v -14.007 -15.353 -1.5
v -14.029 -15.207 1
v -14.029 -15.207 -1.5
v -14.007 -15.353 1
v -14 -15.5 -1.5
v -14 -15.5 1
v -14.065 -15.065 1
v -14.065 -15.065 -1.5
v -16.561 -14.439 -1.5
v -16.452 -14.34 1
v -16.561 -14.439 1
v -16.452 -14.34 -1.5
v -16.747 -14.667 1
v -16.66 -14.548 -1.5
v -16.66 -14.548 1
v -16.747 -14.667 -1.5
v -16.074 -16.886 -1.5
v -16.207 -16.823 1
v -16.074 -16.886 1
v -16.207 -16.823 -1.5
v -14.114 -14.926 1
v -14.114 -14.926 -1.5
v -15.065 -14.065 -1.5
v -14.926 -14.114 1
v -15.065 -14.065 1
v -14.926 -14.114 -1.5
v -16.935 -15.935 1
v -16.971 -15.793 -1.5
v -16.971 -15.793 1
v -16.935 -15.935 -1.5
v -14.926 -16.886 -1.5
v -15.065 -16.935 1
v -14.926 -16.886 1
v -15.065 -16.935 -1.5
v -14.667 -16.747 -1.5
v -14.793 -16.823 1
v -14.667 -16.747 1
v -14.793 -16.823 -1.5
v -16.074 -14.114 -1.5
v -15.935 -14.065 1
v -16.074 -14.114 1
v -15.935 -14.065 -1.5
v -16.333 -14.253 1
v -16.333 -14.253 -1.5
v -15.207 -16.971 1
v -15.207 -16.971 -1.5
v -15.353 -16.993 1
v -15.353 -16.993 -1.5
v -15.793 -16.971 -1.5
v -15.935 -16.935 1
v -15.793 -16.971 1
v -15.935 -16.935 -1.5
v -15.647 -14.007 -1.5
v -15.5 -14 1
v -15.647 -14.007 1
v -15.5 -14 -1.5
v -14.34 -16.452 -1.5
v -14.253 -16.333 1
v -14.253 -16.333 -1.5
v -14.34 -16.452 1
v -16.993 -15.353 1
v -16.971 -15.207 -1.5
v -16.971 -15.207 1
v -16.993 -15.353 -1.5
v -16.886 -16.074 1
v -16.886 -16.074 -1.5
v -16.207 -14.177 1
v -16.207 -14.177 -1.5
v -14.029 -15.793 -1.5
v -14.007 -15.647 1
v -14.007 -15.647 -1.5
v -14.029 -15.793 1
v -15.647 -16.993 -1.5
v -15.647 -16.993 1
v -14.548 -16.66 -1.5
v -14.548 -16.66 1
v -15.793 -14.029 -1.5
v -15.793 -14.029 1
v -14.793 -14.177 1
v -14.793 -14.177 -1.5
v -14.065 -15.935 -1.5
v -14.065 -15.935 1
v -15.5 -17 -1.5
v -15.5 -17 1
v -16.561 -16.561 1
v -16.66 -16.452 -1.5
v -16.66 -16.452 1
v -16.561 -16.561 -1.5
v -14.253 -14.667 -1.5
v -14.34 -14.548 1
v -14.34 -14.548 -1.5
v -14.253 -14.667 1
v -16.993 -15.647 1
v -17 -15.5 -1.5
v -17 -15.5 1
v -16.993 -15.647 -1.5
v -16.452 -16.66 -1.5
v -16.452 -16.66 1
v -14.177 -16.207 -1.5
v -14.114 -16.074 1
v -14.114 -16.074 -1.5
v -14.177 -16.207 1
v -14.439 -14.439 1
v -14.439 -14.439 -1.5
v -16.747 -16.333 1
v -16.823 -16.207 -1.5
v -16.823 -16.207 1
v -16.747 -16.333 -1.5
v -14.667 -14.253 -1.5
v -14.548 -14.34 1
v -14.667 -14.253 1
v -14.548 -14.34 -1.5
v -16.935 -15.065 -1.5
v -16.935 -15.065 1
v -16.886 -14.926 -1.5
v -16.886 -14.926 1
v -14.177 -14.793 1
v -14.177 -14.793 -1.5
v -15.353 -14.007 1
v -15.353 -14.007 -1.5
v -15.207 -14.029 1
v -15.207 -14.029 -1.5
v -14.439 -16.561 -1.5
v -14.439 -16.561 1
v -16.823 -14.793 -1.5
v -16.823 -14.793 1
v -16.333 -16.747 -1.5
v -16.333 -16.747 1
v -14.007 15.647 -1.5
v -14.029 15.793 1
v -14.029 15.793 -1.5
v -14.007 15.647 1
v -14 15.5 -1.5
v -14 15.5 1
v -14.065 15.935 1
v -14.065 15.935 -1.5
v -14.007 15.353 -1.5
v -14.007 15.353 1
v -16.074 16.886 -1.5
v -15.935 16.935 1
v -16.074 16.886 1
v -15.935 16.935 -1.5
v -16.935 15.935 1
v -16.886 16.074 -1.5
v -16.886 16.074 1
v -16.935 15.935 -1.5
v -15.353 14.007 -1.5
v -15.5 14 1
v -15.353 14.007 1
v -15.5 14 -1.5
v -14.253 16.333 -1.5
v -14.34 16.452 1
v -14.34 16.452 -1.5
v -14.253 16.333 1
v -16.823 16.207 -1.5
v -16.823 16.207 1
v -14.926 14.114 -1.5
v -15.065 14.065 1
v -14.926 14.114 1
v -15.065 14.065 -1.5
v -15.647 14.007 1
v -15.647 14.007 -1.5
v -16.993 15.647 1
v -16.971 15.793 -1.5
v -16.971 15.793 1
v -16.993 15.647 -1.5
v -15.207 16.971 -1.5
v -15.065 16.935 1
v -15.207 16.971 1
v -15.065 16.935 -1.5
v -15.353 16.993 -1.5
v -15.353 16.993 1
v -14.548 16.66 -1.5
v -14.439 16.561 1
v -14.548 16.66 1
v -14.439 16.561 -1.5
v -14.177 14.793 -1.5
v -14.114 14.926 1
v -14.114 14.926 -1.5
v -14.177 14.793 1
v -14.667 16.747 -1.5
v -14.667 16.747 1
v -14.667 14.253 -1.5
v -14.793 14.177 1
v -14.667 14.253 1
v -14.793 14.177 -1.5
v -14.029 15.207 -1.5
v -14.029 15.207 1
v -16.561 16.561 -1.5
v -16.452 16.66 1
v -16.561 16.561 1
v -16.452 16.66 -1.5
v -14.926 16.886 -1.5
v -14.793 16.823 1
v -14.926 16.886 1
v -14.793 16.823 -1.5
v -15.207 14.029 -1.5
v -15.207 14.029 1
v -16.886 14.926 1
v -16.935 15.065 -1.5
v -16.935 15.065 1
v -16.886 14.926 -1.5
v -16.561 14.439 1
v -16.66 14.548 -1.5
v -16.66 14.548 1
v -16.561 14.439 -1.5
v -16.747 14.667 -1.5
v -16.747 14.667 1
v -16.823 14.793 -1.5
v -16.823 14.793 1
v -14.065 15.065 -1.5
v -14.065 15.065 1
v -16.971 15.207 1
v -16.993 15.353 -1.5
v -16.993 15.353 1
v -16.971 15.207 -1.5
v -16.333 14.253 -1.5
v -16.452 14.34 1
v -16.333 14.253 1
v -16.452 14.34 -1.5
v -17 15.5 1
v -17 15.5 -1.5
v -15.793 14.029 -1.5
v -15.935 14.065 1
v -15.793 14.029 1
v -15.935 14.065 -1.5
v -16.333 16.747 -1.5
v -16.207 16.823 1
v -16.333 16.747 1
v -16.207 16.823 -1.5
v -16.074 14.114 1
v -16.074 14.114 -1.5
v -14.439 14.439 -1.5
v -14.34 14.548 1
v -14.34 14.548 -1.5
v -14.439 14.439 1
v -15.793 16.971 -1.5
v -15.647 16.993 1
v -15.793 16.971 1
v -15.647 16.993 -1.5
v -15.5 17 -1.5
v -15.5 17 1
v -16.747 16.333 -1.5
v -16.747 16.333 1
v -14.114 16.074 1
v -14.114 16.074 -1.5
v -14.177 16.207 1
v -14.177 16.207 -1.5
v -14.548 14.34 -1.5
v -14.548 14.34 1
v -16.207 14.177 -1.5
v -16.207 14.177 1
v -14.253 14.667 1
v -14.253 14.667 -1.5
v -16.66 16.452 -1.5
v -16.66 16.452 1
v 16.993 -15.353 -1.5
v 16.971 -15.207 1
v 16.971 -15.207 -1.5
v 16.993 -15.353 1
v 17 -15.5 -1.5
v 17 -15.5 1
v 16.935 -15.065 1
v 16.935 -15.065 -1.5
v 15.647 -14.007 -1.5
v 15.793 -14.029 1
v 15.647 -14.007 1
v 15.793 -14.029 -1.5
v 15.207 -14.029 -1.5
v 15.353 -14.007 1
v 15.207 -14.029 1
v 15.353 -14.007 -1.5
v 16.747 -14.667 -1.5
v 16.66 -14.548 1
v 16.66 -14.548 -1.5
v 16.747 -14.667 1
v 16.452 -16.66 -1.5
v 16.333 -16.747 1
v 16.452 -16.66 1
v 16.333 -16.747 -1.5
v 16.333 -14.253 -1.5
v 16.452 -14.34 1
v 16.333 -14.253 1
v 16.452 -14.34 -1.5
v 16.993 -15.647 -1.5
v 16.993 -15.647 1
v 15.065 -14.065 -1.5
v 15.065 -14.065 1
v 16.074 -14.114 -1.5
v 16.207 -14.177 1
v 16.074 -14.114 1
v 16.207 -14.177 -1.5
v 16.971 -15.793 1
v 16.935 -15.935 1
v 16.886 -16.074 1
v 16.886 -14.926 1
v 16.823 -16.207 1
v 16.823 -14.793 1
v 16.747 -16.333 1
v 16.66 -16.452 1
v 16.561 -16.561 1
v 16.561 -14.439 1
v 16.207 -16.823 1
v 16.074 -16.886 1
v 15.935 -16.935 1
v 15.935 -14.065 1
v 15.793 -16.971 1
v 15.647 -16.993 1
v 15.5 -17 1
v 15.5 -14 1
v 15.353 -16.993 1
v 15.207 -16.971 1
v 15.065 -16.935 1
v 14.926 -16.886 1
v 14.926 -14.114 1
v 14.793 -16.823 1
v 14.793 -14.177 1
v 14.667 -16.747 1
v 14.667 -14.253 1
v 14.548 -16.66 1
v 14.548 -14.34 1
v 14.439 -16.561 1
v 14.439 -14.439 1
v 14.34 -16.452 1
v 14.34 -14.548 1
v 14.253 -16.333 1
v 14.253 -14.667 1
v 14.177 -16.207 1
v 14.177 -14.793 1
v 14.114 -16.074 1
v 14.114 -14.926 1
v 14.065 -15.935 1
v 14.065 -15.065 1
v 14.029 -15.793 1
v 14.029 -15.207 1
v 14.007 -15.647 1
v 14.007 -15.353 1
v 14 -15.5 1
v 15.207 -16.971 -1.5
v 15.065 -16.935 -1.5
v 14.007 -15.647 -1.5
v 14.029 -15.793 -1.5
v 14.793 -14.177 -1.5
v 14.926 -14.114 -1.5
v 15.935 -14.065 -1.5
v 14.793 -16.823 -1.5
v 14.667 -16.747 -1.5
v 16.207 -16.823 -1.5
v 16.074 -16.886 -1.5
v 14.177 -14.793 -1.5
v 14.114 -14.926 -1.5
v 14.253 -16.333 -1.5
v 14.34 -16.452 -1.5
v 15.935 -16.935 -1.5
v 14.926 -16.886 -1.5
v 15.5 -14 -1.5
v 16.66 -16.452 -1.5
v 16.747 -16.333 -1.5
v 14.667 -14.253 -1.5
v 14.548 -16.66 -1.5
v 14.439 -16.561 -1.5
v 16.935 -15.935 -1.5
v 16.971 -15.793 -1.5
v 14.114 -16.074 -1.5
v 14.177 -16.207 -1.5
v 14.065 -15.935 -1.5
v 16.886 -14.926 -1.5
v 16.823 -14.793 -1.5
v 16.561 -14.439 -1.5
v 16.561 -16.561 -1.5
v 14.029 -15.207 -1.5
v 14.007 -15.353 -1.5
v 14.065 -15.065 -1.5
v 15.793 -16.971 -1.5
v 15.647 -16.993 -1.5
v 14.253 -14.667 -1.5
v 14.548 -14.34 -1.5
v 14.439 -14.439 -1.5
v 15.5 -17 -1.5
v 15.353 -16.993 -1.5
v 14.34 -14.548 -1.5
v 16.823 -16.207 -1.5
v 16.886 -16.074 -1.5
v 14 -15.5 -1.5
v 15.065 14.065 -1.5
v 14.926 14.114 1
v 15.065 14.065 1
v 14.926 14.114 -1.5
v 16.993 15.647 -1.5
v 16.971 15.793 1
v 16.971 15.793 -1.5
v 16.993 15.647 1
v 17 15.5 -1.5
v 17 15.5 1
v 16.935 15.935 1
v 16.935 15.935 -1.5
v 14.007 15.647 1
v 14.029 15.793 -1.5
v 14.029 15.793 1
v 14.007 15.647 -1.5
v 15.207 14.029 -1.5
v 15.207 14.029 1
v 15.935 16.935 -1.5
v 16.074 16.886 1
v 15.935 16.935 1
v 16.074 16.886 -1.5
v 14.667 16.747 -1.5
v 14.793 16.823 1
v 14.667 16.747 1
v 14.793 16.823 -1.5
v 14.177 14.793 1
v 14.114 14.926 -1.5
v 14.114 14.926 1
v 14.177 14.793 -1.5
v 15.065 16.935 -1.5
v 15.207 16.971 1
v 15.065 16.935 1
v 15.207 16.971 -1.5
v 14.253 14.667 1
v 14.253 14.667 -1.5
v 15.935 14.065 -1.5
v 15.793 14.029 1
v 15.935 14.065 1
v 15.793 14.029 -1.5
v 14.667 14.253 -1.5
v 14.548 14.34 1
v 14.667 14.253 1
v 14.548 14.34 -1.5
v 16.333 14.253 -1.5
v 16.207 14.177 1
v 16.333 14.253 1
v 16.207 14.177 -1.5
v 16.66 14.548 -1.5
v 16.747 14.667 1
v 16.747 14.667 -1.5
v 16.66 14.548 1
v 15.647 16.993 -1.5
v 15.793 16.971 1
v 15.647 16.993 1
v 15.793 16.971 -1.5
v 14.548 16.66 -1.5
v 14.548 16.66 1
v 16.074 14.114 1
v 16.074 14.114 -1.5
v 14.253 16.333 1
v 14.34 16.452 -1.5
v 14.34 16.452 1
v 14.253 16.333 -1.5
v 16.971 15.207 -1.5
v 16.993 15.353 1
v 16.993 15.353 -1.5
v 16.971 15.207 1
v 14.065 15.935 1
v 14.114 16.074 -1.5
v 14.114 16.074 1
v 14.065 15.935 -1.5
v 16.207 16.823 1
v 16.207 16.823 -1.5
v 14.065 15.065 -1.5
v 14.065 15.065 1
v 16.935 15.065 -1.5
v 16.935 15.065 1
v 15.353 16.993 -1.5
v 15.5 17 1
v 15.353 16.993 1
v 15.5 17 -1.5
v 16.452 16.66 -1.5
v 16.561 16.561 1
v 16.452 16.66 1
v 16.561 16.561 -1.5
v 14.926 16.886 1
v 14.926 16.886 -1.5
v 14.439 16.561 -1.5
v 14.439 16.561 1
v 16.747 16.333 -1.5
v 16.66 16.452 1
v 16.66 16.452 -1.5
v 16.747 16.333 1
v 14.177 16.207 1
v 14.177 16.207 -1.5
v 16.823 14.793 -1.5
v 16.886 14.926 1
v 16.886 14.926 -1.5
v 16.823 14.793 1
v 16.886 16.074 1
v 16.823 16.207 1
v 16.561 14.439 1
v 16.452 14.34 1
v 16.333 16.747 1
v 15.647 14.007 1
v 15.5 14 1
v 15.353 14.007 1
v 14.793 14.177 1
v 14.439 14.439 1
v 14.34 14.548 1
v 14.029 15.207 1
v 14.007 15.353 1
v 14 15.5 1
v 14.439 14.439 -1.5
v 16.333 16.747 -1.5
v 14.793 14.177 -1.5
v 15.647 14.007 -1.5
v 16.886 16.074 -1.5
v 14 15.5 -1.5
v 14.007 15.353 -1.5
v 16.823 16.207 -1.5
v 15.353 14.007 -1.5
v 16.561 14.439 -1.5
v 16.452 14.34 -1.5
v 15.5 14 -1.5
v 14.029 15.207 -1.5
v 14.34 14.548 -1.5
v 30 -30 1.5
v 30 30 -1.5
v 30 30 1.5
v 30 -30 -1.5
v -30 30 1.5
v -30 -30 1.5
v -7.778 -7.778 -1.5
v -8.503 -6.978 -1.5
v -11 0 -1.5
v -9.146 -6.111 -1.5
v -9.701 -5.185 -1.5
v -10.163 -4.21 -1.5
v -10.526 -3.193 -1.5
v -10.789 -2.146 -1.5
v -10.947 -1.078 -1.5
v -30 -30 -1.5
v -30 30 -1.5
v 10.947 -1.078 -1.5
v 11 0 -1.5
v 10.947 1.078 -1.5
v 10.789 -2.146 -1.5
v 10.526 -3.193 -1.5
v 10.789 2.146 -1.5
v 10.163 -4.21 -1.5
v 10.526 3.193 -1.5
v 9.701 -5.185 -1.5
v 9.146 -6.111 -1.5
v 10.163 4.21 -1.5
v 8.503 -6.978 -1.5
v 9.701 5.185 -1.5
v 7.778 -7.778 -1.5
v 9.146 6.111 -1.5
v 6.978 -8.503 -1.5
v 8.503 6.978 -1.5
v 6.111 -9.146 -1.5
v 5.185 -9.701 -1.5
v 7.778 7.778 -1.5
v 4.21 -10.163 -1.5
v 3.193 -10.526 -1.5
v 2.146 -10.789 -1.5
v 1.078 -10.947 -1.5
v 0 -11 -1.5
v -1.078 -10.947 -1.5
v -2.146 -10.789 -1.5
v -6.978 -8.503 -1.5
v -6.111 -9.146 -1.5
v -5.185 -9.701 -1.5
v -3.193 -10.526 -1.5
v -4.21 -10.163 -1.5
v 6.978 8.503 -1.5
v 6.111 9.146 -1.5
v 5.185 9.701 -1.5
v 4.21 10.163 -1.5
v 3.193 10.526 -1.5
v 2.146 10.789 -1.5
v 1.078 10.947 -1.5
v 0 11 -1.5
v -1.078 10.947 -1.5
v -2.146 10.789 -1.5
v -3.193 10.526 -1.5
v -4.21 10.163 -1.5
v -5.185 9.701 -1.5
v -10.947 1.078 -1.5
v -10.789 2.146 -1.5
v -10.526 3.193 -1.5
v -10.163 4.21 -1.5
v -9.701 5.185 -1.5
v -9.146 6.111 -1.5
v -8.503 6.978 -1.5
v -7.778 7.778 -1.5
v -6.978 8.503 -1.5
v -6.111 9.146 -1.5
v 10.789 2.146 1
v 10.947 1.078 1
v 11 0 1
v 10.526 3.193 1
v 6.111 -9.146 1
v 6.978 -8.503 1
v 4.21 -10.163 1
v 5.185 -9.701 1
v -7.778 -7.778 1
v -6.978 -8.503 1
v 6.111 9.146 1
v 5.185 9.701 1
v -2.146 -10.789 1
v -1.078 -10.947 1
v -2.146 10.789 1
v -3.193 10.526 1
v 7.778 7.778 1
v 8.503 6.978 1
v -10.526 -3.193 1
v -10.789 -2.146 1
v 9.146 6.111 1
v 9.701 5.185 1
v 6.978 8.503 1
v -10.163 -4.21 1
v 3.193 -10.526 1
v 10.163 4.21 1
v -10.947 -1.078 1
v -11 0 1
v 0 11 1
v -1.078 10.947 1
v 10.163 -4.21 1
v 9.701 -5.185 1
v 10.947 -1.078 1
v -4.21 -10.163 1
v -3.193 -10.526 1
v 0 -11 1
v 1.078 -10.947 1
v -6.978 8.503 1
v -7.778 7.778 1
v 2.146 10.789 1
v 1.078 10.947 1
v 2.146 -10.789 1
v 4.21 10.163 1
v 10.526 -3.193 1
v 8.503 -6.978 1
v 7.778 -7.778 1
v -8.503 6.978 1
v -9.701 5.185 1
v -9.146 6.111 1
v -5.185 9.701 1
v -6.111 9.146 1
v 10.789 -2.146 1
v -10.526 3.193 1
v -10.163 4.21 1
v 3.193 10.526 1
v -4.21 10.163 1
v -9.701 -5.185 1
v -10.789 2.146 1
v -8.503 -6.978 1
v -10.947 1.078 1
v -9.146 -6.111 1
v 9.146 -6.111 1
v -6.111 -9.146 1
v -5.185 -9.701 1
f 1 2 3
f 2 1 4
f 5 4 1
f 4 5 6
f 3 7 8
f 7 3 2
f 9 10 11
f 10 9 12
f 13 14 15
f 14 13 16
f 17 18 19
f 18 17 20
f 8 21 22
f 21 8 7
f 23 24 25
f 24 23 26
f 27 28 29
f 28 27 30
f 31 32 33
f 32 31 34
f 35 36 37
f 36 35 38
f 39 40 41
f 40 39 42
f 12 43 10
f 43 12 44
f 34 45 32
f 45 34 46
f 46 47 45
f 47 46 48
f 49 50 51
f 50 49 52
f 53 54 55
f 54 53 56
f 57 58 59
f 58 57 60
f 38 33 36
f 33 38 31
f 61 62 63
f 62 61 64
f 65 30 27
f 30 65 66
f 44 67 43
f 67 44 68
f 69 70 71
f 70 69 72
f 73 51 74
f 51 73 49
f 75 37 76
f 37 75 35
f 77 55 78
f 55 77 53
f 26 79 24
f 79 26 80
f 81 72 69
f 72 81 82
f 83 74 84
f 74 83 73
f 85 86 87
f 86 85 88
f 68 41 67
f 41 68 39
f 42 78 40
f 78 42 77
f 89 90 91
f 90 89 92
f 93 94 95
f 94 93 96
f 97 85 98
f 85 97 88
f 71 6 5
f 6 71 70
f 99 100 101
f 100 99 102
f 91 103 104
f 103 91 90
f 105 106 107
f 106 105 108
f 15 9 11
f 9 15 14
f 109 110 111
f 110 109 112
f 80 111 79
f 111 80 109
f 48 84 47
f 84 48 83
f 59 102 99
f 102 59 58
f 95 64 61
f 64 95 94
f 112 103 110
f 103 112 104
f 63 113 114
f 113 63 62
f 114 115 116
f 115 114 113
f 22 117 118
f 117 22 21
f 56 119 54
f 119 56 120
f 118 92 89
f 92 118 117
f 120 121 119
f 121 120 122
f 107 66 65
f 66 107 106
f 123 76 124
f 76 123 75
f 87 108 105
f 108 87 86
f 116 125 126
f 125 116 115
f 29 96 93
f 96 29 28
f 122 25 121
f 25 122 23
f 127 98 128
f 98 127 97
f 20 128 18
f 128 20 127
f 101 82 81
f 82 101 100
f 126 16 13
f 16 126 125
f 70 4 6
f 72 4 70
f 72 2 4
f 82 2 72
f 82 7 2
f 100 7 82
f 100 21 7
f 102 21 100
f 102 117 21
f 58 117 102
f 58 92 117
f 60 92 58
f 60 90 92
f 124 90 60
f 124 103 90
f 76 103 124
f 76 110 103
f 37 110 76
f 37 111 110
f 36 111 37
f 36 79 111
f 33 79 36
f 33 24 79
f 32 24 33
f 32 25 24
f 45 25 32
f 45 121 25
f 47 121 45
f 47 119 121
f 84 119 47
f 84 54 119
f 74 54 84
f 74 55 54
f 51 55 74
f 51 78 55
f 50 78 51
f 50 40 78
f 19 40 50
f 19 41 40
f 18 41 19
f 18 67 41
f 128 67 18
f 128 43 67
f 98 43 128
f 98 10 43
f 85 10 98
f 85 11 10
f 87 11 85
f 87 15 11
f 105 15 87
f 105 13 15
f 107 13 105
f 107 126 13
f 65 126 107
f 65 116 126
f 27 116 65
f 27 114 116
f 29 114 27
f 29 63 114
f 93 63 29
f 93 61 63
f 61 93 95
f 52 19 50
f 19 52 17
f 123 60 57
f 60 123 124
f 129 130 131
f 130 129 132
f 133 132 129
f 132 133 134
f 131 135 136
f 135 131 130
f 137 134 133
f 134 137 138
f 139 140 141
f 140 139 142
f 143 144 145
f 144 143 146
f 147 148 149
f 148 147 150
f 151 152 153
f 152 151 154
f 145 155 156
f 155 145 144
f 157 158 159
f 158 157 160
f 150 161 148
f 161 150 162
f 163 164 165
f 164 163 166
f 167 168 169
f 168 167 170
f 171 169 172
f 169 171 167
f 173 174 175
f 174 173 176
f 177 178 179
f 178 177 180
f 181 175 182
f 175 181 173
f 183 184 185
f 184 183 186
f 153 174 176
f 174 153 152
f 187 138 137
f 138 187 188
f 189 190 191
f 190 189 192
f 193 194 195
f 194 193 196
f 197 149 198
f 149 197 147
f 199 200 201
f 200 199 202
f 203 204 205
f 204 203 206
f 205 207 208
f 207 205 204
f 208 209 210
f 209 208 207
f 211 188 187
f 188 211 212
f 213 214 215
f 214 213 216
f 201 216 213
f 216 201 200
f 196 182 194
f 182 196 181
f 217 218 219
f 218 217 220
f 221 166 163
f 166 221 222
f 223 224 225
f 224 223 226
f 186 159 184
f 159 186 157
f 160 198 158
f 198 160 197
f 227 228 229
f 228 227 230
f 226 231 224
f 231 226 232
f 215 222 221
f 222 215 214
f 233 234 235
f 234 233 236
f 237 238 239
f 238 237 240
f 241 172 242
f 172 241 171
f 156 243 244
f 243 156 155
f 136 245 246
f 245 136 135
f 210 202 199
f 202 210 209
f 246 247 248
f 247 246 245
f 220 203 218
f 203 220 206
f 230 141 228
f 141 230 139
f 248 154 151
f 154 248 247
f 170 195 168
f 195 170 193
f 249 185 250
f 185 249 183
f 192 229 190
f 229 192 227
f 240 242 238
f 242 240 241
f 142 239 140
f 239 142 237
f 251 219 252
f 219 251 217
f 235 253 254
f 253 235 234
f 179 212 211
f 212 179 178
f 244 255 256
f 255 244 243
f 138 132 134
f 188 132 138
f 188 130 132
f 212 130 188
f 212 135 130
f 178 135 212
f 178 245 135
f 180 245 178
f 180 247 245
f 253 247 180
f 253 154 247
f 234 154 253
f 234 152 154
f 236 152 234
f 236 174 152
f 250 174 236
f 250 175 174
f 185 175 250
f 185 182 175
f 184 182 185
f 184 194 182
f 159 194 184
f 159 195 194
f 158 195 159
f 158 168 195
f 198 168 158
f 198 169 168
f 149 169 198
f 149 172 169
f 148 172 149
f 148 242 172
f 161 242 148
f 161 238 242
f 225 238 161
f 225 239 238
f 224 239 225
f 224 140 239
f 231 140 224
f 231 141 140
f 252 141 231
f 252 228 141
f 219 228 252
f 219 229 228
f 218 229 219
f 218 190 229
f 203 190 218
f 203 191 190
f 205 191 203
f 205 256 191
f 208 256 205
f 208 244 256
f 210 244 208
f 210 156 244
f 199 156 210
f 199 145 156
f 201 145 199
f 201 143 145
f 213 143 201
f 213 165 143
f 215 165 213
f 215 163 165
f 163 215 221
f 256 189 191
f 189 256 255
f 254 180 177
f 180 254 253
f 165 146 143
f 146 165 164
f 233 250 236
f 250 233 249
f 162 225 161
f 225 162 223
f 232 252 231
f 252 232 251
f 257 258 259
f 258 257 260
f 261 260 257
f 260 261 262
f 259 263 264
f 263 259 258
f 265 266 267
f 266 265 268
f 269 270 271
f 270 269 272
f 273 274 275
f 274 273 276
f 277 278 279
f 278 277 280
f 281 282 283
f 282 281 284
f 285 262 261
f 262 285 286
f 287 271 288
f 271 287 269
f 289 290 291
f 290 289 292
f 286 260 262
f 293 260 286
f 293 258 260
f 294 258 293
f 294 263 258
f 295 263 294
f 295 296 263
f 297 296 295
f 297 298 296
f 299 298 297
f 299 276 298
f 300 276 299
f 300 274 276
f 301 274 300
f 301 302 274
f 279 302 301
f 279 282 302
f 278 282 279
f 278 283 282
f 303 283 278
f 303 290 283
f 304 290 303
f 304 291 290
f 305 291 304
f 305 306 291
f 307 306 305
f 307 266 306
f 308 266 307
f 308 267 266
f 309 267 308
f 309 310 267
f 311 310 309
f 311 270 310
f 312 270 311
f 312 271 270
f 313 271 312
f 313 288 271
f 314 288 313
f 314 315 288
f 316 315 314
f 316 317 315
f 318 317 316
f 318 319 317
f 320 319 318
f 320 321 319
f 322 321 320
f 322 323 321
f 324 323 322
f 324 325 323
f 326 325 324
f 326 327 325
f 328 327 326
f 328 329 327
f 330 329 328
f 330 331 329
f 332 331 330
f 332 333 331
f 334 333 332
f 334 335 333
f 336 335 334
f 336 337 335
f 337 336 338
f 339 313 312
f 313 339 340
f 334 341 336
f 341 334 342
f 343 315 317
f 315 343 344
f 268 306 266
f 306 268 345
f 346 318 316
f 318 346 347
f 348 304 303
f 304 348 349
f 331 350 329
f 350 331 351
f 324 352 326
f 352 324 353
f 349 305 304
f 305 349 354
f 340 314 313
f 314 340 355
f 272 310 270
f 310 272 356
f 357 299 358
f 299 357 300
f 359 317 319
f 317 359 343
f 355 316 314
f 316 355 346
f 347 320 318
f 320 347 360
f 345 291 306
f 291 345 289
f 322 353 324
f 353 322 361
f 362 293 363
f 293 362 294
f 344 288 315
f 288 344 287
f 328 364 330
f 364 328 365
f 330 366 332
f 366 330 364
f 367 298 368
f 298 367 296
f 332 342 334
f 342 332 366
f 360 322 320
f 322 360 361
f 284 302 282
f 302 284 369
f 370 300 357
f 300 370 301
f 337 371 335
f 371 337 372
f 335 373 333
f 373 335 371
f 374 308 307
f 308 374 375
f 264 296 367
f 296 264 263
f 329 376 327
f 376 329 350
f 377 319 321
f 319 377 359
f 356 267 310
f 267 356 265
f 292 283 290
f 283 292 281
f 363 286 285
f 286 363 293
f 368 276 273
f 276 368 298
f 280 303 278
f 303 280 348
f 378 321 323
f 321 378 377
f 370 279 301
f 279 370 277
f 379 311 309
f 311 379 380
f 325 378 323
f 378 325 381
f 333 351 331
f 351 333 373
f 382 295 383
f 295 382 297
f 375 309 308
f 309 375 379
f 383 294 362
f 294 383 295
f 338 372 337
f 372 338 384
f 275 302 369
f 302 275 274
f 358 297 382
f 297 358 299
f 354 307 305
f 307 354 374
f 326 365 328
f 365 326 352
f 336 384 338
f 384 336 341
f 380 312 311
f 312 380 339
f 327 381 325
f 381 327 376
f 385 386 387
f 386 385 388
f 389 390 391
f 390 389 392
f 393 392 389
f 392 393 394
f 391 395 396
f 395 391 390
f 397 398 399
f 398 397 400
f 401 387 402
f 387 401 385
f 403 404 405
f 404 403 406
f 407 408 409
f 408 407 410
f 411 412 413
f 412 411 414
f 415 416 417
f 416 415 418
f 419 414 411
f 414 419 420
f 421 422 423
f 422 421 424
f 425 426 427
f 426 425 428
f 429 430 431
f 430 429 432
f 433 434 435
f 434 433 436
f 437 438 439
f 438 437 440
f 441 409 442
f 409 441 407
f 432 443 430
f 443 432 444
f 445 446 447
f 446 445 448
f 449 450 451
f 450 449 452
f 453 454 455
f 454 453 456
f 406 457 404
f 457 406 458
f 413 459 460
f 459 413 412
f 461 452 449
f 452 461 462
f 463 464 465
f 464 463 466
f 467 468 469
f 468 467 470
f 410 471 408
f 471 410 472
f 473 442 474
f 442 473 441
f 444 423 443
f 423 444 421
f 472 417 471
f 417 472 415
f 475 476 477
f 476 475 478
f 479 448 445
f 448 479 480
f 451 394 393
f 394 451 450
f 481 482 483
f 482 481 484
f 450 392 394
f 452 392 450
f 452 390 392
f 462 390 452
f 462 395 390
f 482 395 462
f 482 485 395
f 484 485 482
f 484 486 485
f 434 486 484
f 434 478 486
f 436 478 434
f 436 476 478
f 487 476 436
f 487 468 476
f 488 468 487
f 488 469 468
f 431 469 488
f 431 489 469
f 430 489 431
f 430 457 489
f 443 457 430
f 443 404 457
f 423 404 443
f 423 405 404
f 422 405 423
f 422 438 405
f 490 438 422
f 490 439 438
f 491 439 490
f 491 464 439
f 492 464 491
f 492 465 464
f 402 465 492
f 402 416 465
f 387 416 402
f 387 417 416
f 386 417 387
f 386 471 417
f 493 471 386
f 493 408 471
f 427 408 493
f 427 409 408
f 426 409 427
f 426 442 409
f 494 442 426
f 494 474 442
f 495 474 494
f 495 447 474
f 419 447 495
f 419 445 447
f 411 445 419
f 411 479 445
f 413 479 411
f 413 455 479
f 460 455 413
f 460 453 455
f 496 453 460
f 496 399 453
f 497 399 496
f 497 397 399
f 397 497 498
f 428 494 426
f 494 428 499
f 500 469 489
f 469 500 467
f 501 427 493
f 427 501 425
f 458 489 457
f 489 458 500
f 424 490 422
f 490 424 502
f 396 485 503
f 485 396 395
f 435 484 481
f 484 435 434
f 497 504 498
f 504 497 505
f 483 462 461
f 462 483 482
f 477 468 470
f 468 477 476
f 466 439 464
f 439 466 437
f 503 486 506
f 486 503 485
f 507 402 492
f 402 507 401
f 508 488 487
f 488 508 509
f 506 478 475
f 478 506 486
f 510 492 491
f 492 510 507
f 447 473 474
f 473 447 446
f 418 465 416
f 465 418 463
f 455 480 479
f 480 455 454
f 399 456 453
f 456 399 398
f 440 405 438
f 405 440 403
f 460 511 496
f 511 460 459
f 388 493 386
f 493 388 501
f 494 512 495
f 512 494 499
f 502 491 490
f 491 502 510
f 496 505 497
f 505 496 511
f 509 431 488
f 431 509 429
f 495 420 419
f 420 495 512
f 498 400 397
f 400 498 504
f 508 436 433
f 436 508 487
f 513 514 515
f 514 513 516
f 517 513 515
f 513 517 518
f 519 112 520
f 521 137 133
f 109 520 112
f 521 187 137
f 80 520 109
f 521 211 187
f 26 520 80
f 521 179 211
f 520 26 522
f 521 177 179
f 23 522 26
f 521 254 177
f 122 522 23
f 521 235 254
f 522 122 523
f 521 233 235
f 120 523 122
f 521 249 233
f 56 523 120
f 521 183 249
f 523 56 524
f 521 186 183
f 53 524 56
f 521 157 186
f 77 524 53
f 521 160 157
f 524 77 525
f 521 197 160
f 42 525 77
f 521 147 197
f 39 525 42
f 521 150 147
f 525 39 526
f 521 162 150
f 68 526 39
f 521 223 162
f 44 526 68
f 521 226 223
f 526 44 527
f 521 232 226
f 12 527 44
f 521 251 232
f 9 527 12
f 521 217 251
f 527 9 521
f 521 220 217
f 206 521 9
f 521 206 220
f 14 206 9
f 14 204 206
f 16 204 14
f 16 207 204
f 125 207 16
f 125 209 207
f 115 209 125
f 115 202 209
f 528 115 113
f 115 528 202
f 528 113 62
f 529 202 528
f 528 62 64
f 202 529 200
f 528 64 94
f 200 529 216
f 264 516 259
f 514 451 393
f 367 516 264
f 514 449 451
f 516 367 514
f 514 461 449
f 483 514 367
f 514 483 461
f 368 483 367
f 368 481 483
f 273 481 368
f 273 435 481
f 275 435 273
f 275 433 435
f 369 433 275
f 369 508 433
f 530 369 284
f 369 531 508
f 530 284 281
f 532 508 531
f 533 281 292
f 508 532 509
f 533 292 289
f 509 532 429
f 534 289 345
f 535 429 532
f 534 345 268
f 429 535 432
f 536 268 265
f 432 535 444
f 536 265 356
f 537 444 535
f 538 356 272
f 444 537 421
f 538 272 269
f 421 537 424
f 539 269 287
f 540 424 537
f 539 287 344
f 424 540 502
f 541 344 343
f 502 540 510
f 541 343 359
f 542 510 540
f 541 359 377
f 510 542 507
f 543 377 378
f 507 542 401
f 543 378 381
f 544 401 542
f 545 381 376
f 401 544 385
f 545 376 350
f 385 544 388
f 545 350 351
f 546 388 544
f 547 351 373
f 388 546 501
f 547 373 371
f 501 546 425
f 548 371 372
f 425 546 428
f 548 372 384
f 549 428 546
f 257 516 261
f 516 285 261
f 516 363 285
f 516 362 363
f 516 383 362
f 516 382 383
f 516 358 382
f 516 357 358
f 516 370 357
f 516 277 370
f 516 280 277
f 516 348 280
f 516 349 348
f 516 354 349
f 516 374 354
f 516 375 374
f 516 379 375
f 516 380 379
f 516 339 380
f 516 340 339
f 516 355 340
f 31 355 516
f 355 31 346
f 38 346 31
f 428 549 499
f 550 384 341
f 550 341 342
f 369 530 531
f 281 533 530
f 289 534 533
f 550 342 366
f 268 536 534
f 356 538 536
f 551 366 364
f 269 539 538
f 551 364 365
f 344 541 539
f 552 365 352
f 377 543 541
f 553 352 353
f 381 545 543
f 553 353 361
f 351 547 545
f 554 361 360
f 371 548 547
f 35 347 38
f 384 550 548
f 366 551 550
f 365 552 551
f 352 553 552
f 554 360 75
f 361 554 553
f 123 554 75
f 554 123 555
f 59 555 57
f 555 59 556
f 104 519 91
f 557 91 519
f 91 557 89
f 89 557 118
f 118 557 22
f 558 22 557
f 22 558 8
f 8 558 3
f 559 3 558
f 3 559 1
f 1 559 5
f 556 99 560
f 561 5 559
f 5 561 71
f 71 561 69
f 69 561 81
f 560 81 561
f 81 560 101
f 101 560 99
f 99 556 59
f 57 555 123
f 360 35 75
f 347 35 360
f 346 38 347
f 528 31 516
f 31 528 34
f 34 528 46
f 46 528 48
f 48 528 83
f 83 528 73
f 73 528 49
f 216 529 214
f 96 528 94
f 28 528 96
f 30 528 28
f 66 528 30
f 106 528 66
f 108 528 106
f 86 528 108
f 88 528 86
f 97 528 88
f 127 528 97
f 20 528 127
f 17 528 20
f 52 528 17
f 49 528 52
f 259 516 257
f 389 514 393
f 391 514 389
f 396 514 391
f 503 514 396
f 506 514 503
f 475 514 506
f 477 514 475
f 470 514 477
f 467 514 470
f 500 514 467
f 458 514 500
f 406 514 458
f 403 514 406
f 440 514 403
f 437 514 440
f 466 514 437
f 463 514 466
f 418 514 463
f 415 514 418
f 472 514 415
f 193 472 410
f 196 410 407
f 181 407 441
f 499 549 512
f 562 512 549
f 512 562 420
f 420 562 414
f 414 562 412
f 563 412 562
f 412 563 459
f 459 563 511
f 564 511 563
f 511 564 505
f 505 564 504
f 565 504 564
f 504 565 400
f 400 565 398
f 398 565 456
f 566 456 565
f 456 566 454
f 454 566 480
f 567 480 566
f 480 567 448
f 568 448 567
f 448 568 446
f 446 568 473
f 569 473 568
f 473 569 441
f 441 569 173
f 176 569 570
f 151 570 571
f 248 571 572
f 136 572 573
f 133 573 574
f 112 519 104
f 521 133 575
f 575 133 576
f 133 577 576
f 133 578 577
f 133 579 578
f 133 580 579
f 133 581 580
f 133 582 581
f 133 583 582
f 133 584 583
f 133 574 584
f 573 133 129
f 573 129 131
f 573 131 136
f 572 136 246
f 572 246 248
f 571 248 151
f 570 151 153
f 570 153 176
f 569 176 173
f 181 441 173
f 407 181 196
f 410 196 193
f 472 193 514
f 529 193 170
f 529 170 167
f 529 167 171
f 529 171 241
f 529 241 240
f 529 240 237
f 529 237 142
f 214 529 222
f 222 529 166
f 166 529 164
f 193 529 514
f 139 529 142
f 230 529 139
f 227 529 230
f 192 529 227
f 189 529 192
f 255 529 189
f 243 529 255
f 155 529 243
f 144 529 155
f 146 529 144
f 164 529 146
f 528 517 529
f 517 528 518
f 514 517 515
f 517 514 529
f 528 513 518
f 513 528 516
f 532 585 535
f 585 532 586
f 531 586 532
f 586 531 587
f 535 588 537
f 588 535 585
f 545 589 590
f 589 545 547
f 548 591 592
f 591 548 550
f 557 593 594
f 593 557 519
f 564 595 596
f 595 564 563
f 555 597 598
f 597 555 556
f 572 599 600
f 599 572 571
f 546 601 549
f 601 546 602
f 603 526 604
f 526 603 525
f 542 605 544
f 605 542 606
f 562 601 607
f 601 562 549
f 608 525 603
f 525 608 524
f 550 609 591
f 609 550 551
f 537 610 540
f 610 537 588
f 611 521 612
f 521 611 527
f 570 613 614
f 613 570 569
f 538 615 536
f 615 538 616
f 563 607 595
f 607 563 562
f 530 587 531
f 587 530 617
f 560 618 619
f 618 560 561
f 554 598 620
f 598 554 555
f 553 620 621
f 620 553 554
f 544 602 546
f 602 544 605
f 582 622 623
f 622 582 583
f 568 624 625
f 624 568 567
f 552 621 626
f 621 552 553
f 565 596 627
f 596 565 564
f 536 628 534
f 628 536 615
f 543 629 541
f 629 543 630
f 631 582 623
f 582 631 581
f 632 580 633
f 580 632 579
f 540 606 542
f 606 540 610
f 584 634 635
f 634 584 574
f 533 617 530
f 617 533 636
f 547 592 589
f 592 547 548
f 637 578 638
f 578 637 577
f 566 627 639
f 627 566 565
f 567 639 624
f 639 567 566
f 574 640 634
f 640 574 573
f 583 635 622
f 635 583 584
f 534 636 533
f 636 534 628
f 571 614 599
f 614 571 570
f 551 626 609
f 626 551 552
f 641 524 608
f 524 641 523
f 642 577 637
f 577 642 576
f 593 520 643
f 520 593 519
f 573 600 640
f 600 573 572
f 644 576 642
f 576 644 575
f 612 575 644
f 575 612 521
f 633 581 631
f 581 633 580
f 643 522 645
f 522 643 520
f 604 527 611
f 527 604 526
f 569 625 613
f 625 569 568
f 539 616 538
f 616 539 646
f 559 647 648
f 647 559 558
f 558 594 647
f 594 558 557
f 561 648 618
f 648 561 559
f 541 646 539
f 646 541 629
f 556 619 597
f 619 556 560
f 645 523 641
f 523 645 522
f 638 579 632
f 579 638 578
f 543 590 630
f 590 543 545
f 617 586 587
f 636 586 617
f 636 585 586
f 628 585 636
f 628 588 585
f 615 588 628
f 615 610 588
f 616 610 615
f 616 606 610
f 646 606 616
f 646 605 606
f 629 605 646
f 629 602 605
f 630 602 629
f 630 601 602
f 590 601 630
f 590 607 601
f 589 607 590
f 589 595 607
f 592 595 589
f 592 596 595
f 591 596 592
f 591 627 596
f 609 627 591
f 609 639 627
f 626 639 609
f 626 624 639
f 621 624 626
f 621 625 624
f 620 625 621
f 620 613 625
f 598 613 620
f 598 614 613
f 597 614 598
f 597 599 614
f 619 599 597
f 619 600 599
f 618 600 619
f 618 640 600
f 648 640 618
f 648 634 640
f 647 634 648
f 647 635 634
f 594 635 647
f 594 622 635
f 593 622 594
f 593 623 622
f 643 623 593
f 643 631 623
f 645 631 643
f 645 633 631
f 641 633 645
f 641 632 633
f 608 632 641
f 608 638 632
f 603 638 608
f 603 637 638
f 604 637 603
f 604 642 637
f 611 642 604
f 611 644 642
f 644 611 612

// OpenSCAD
$fn=64;

module nema17_mount() {
    difference() {
        // Base plate
        cube([60, 60, 3], center=true);
        
        // Center bore
        translate([0, 0, -1.5])
            cylinder(h=5, d=22, center=true);
        
        // Mounting holes
        for (x = [-15.5, 15.5])
            for (y = [-15.5, 15.5])
                translate([x, y, -1.5])
                    cylinder(h=5, d=3, center=true);
    }
}

nema17_mount();
